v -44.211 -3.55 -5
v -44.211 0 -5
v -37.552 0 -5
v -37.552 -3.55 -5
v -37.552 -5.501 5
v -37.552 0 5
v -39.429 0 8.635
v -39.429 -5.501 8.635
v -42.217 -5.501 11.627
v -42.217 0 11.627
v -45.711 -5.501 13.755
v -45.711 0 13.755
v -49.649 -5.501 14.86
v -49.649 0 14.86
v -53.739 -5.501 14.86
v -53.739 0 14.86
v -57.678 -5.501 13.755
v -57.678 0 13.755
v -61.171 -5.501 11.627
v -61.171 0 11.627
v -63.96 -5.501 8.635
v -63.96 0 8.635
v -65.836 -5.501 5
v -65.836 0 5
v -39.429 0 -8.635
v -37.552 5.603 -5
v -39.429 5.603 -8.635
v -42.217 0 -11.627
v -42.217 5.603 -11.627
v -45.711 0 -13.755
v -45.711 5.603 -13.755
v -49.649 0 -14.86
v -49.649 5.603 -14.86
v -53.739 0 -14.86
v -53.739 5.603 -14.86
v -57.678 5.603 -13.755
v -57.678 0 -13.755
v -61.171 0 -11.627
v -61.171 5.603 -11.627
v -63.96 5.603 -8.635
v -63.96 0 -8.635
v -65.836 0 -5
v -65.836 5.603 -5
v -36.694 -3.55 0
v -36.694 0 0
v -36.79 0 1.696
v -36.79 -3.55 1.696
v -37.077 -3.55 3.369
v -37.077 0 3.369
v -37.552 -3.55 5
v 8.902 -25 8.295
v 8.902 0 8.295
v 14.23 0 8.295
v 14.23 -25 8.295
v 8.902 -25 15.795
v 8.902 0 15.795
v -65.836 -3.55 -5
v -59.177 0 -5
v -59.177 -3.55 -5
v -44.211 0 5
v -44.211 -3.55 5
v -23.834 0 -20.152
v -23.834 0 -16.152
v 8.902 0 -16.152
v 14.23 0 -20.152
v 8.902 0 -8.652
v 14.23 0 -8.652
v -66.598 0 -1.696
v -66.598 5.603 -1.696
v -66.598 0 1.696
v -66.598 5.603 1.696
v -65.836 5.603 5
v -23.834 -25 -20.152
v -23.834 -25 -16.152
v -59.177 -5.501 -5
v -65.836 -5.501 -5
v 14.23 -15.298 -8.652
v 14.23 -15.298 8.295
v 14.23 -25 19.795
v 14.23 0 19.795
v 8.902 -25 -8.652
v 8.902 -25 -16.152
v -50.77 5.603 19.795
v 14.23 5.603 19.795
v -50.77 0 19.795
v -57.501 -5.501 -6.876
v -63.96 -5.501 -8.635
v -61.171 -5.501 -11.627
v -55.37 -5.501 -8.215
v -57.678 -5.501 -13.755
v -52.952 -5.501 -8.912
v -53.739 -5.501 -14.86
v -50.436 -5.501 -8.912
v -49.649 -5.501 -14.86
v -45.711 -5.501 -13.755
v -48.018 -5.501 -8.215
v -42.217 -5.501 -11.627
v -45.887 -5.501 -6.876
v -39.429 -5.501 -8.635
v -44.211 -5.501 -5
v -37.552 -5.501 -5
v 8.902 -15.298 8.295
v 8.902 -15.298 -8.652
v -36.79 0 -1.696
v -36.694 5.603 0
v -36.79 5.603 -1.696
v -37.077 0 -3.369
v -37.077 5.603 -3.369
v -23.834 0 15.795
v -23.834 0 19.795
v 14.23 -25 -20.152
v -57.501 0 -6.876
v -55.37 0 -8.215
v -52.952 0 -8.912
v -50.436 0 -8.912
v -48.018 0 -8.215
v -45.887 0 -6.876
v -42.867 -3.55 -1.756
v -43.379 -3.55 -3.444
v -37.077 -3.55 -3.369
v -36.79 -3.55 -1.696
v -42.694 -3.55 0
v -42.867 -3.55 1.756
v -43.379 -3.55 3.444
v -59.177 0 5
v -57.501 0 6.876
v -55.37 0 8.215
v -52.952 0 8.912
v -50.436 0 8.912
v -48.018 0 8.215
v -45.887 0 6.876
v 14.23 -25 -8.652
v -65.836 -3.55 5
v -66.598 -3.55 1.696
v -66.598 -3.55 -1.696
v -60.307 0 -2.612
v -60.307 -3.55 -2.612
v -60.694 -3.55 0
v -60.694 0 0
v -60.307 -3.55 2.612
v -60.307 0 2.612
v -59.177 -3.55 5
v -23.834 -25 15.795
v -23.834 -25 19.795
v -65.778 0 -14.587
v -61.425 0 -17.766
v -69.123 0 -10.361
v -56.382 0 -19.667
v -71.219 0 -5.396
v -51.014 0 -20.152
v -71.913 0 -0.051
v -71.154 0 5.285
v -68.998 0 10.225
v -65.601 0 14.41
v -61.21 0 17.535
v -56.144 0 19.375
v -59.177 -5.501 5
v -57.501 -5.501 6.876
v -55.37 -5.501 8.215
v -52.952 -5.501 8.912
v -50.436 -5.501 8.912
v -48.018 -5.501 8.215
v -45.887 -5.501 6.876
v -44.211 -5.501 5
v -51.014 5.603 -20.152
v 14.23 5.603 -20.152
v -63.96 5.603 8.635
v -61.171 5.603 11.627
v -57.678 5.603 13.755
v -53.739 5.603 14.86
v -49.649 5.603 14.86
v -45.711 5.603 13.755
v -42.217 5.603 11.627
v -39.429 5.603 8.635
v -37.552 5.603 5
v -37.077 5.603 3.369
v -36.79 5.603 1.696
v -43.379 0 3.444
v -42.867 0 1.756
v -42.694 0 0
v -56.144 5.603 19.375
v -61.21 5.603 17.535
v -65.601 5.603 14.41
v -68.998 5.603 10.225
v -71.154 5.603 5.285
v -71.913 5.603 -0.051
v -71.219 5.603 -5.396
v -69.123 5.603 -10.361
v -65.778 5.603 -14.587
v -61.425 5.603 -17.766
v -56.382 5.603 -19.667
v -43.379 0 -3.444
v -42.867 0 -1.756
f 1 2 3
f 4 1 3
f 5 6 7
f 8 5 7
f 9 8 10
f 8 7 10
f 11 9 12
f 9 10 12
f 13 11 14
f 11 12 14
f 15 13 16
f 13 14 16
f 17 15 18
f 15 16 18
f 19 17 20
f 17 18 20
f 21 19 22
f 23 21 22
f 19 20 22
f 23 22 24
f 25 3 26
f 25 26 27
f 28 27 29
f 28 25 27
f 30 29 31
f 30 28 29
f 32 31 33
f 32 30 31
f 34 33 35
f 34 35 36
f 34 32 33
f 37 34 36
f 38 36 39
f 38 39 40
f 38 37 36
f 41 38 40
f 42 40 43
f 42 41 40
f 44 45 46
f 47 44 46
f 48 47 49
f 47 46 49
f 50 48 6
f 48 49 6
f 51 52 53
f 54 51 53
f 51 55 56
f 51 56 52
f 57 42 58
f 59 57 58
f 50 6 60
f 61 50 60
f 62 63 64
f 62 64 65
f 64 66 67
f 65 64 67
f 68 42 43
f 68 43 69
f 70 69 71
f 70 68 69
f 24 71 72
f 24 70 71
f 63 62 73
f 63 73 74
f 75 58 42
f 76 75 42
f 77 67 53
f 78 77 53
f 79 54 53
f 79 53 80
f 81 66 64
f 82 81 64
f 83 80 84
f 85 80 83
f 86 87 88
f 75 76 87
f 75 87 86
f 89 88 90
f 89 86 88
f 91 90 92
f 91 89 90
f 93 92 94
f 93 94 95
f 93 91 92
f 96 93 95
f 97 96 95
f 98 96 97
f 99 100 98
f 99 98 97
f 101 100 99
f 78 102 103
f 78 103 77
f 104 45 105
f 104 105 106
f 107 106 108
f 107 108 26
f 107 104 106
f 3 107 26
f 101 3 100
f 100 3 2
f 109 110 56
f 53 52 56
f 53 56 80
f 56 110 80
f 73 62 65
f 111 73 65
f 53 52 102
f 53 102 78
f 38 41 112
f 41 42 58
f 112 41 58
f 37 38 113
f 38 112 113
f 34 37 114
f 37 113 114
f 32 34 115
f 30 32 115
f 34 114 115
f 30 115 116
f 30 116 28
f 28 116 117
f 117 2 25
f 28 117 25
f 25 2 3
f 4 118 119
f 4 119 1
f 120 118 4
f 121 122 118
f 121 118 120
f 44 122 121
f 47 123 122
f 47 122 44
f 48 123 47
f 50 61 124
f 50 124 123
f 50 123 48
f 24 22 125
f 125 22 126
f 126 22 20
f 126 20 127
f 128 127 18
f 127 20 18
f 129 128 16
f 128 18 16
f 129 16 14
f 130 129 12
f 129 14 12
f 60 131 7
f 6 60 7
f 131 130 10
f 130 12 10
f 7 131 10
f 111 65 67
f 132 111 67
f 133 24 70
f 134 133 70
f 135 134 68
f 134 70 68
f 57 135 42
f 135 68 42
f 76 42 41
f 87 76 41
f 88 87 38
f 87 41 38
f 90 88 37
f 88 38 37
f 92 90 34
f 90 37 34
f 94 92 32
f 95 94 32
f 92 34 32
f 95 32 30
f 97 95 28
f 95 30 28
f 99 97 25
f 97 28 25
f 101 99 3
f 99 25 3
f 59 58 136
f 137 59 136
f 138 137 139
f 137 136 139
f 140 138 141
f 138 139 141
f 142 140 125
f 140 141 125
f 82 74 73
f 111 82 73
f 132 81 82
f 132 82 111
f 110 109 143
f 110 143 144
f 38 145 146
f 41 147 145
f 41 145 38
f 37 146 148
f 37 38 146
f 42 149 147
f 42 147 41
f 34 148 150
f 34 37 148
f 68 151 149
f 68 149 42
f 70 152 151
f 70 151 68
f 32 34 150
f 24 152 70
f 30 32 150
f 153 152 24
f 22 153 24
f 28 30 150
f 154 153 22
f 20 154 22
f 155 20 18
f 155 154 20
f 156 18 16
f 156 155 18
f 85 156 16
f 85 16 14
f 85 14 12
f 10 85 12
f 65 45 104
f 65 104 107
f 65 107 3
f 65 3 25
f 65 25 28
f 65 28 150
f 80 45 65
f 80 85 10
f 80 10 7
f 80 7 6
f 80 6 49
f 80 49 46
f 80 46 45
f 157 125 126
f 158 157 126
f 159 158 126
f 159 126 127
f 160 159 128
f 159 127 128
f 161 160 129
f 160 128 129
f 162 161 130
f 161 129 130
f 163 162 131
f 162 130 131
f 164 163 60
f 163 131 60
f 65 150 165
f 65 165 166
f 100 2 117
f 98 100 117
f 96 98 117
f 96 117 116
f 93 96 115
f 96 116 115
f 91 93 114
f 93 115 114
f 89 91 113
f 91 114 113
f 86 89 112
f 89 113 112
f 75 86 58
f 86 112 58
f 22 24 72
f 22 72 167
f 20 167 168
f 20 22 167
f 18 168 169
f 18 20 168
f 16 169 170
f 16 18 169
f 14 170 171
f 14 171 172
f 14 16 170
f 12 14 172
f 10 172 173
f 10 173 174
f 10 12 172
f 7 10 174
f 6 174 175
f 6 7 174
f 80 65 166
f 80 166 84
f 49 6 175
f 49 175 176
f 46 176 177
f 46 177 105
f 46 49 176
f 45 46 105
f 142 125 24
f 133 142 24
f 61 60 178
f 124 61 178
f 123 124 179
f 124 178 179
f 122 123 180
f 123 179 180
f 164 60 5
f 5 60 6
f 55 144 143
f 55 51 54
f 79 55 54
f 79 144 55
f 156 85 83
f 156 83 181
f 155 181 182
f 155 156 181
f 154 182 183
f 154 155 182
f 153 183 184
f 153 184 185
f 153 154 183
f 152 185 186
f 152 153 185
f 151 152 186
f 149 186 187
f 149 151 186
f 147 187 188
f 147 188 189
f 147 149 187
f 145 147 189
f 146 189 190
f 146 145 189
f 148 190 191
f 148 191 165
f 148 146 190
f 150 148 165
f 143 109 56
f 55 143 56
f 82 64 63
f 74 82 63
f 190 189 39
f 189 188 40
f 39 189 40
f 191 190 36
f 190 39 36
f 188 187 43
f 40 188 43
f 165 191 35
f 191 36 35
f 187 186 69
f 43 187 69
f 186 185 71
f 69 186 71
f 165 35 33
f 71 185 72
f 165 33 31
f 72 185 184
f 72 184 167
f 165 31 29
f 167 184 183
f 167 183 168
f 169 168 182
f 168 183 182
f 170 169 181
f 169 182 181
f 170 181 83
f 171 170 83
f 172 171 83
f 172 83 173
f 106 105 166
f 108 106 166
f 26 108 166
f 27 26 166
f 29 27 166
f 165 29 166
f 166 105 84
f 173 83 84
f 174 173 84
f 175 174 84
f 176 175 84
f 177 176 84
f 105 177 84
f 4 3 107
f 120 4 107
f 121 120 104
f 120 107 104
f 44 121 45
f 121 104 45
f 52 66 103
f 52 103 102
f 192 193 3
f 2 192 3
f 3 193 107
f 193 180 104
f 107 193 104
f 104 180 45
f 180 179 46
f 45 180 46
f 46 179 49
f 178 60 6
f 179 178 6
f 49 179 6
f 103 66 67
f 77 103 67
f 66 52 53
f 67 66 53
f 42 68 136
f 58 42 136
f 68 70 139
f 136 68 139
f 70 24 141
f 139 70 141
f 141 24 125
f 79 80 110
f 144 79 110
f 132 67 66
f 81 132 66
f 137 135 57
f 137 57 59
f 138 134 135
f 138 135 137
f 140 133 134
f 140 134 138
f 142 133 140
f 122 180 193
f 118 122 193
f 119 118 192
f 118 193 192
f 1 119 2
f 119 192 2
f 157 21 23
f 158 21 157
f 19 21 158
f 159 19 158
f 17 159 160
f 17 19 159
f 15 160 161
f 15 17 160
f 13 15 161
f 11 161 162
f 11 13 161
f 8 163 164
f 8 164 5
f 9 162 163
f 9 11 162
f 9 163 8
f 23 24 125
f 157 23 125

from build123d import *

# Parameters (mm, degrees)
F0_W     = 13.0633687865
F0_H     = 4
F1_DEPTH = 25
F0_W_2   = 5.3273958752
F0_H_2   = 16.9470865311
F2_DEPTH = 15.29844
F3_DEPTH = 5.60268
F4_DEPTH = 5.50137
F5_DEPTH = 3.54962


with BuildPart() as f1:
    # F0 (on Front) → F1 (new body)
    with BuildSketch(Plane.XZ):
        with Locations((-17.3018605316, 17.7946619055)):
            Rectangle(F0_W, F0_H)
        Polygon((14.2298238616, 19.7946619055), (-10.7701761384, 19.7946619055), (-10.7701761384, 15.7946619055), (8.9024279864, 15.7946619055), (8.9024279864, 8.2946619055), (14.2298238616, 8.2946619055), align=None)
    extrude(amount=F1_DEPTH)


with BuildPart() as f1b:
    # F0 (on Front) → F1, piece 2 (new body)
    with BuildSketch(Plane.XZ):
        with Locations((-17.3018605316, -18.1524246256)):
            Rectangle(F0_W, F0_H)
        Polygon((-10.7701761384, -16.1524246256), (-10.7701761384, -20.1524246256), (14.2298238616, -20.1524246256), (14.2298238616, -8.6524246256), (8.9024279864, -8.6524246256), (8.9024279864, -16.1524246256), align=None)
    extrude(amount=F1_DEPTH)


with BuildPart() as f2:
    # F0 (on Front) → F2 (new body)
    with BuildSketch(Plane.XZ):
        with Locations((11.566125924, -0.17888136)):
            Rectangle(F0_W_2, F0_H_2)
    extrude(amount=F2_DEPTH)


with BuildPart() as f3:
    # F0 (on Front) → F3 (new body)
    with BuildSketch(Plane.XZ):
        with BuildLine():
            Line((-23.8335449249, 19.7946619055), (-50.7701761384, 19.7946619055))
            ThreePointArc((-50.7701761384, 19.7946619055), (-71.9127214151, -0.0507043658), (-51.0137591008, -20.1524246256))
            Line((-51.0137591008, -20.1524246256), (-23.8335449249, -20.1524246256))
            Line((-23.8335449249, -20.1524246256), (-23.8335449249, -16.1524246256))
            Line((-23.8335449249, -16.1524246256), (-10.7701761384, -16.1524246256))
            Line((-10.7701761384, -16.1524246256), (8.9024279864, -16.1524246256))
            Line((8.9024279864, -16.1524246256), (8.9024279864, -8.6524246256))
            Line((8.9024279864, -8.6524246256), (8.9024279864, 8.2946619055))
            Line((8.9024279864, 8.2946619055), (8.9024279864, 15.7946619055))
            Line((8.9024279864, 15.7946619055), (-10.7701761384, 15.7946619055))
            Line((-10.7701761384, 15.7946619055), (-23.8335449249, 15.7946619055))
            Line((-23.8335449249, 15.7946619055), (-23.8335449249, 19.7946619055))
        make_face()
        with BuildLine():
            ThreePointArc((-65.8362626746, 5), (-51.6941270508, 15), (-37.5519914271, 5))
            ThreePointArc((-37.5519914271, 5), (-36.910148656, 2.5365296809), (-36.6941270508, 0))
            ThreePointArc((-36.6941270508, 0), (-36.910148656, -2.5365296809), (-37.5519914271, -5))
            ThreePointArc((-37.5519914271, -5), (-51.6941270508, -15), (-65.8362626746, -5))
            ThreePointArc((-65.8362626746, -5), (-66.6941270508, 0), (-65.8362626746, 5))
        make_face(mode=Mode.SUBTRACT)
        with Locations((-17.3018605316, 17.7946619055)):
            Rectangle(F0_W, F0_H)
        with Locations((-17.3018605316, -18.1524246256)):
            Rectangle(F0_W, F0_H)
        Polygon((14.2298238616, 19.7946619055), (-10.7701761384, 19.7946619055), (-10.7701761384, 15.7946619055), (8.9024279864, 15.7946619055), (8.9024279864, 8.2946619055), (14.2298238616, 8.2946619055), align=None)
        Polygon((-10.7701761384, -16.1524246256), (-10.7701761384, -20.1524246256), (14.2298238616, -20.1524246256), (14.2298238616, -8.6524246256), (8.9024279864, -8.6524246256), (8.9024279864, -16.1524246256), align=None)
        with Locations((11.566125924, -0.17888136)):
            Rectangle(F0_W_2, F0_H_2)
    extrude(amount=-F3_DEPTH)


with BuildPart() as f4:
    # F0 (on Front) → F4 (new body)
    with BuildSketch(Plane.XZ):
        with BuildLine():
            Line((-37.5519914271, -5), (-44.2108122773, -5))
            ThreePointArc((-44.2108122773, -5), (-51.6941270508, -9), (-59.1774418244, -5))
            Line((-59.1774418244, -5), (-65.8362626746, -5))
            ThreePointArc((-65.8362626746, -5), (-51.6941270508, -15), (-37.5519914271, -5))
        make_face()
    extrude(amount=F4_DEPTH)


with BuildPart() as f4b:
    # F0 (on Front) → F4, piece 2 (new body)
    with BuildSketch(Plane.XZ):
        with BuildLine():
            ThreePointArc((-59.1774418244, 5), (-51.6941270508, 9), (-44.2108122773, 5))
            Line((-44.2108122773, 5), (-37.5519914271, 5))
            ThreePointArc((-37.5519914271, 5), (-51.6941270508, 15), (-65.8362626746, 5))
            Line((-65.8362626746, 5), (-59.1774418244, 5))
        make_face()
    extrude(amount=F4_DEPTH)


with BuildPart() as f5:
    # F0 (on Front) → F5 (new body)
    with BuildSketch(Plane.XZ):
        with BuildLine():
            ThreePointArc((-59.1774418244, -5), (-60.6941270508, 0), (-59.1774418244, 5))
            Line((-59.1774418244, 5), (-65.8362626746, 5))
            ThreePointArc((-65.8362626746, 5), (-66.6941270508, 0), (-65.8362626746, -5))
            Line((-65.8362626746, -5), (-59.1774418244, -5))
        make_face()
    extrude(amount=F5_DEPTH)


with BuildPart() as f5b:
    # F0 (on Front) → F5, piece 2 (new body)
    with BuildSketch(Plane.XZ):
        with BuildLine():
            ThreePointArc((-44.2108122773, 5), (-43.0816409707, 2.6124860802), (-42.6941270508, 0))
            ThreePointArc((-42.6941270508, 0), (-43.0816409707, -2.6124860802), (-44.2108122773, -5))
            Line((-44.2108122773, -5), (-37.5519914271, -5))
            ThreePointArc((-37.5519914271, -5), (-36.910148656, -2.5365296809), (-36.6941270508, 0))
            ThreePointArc((-36.6941270508, 0), (-36.910148656, 2.5365296809), (-37.5519914271, 5))
            Line((-37.5519914271, 5), (-44.2108122773, 5))
        make_face()
    extrude(amount=F5_DEPTH)


solid = Compound([f1.part, f1b.part, f2.part, f3.part, f4.part, f4b.part, f5.part, f5b.part])
